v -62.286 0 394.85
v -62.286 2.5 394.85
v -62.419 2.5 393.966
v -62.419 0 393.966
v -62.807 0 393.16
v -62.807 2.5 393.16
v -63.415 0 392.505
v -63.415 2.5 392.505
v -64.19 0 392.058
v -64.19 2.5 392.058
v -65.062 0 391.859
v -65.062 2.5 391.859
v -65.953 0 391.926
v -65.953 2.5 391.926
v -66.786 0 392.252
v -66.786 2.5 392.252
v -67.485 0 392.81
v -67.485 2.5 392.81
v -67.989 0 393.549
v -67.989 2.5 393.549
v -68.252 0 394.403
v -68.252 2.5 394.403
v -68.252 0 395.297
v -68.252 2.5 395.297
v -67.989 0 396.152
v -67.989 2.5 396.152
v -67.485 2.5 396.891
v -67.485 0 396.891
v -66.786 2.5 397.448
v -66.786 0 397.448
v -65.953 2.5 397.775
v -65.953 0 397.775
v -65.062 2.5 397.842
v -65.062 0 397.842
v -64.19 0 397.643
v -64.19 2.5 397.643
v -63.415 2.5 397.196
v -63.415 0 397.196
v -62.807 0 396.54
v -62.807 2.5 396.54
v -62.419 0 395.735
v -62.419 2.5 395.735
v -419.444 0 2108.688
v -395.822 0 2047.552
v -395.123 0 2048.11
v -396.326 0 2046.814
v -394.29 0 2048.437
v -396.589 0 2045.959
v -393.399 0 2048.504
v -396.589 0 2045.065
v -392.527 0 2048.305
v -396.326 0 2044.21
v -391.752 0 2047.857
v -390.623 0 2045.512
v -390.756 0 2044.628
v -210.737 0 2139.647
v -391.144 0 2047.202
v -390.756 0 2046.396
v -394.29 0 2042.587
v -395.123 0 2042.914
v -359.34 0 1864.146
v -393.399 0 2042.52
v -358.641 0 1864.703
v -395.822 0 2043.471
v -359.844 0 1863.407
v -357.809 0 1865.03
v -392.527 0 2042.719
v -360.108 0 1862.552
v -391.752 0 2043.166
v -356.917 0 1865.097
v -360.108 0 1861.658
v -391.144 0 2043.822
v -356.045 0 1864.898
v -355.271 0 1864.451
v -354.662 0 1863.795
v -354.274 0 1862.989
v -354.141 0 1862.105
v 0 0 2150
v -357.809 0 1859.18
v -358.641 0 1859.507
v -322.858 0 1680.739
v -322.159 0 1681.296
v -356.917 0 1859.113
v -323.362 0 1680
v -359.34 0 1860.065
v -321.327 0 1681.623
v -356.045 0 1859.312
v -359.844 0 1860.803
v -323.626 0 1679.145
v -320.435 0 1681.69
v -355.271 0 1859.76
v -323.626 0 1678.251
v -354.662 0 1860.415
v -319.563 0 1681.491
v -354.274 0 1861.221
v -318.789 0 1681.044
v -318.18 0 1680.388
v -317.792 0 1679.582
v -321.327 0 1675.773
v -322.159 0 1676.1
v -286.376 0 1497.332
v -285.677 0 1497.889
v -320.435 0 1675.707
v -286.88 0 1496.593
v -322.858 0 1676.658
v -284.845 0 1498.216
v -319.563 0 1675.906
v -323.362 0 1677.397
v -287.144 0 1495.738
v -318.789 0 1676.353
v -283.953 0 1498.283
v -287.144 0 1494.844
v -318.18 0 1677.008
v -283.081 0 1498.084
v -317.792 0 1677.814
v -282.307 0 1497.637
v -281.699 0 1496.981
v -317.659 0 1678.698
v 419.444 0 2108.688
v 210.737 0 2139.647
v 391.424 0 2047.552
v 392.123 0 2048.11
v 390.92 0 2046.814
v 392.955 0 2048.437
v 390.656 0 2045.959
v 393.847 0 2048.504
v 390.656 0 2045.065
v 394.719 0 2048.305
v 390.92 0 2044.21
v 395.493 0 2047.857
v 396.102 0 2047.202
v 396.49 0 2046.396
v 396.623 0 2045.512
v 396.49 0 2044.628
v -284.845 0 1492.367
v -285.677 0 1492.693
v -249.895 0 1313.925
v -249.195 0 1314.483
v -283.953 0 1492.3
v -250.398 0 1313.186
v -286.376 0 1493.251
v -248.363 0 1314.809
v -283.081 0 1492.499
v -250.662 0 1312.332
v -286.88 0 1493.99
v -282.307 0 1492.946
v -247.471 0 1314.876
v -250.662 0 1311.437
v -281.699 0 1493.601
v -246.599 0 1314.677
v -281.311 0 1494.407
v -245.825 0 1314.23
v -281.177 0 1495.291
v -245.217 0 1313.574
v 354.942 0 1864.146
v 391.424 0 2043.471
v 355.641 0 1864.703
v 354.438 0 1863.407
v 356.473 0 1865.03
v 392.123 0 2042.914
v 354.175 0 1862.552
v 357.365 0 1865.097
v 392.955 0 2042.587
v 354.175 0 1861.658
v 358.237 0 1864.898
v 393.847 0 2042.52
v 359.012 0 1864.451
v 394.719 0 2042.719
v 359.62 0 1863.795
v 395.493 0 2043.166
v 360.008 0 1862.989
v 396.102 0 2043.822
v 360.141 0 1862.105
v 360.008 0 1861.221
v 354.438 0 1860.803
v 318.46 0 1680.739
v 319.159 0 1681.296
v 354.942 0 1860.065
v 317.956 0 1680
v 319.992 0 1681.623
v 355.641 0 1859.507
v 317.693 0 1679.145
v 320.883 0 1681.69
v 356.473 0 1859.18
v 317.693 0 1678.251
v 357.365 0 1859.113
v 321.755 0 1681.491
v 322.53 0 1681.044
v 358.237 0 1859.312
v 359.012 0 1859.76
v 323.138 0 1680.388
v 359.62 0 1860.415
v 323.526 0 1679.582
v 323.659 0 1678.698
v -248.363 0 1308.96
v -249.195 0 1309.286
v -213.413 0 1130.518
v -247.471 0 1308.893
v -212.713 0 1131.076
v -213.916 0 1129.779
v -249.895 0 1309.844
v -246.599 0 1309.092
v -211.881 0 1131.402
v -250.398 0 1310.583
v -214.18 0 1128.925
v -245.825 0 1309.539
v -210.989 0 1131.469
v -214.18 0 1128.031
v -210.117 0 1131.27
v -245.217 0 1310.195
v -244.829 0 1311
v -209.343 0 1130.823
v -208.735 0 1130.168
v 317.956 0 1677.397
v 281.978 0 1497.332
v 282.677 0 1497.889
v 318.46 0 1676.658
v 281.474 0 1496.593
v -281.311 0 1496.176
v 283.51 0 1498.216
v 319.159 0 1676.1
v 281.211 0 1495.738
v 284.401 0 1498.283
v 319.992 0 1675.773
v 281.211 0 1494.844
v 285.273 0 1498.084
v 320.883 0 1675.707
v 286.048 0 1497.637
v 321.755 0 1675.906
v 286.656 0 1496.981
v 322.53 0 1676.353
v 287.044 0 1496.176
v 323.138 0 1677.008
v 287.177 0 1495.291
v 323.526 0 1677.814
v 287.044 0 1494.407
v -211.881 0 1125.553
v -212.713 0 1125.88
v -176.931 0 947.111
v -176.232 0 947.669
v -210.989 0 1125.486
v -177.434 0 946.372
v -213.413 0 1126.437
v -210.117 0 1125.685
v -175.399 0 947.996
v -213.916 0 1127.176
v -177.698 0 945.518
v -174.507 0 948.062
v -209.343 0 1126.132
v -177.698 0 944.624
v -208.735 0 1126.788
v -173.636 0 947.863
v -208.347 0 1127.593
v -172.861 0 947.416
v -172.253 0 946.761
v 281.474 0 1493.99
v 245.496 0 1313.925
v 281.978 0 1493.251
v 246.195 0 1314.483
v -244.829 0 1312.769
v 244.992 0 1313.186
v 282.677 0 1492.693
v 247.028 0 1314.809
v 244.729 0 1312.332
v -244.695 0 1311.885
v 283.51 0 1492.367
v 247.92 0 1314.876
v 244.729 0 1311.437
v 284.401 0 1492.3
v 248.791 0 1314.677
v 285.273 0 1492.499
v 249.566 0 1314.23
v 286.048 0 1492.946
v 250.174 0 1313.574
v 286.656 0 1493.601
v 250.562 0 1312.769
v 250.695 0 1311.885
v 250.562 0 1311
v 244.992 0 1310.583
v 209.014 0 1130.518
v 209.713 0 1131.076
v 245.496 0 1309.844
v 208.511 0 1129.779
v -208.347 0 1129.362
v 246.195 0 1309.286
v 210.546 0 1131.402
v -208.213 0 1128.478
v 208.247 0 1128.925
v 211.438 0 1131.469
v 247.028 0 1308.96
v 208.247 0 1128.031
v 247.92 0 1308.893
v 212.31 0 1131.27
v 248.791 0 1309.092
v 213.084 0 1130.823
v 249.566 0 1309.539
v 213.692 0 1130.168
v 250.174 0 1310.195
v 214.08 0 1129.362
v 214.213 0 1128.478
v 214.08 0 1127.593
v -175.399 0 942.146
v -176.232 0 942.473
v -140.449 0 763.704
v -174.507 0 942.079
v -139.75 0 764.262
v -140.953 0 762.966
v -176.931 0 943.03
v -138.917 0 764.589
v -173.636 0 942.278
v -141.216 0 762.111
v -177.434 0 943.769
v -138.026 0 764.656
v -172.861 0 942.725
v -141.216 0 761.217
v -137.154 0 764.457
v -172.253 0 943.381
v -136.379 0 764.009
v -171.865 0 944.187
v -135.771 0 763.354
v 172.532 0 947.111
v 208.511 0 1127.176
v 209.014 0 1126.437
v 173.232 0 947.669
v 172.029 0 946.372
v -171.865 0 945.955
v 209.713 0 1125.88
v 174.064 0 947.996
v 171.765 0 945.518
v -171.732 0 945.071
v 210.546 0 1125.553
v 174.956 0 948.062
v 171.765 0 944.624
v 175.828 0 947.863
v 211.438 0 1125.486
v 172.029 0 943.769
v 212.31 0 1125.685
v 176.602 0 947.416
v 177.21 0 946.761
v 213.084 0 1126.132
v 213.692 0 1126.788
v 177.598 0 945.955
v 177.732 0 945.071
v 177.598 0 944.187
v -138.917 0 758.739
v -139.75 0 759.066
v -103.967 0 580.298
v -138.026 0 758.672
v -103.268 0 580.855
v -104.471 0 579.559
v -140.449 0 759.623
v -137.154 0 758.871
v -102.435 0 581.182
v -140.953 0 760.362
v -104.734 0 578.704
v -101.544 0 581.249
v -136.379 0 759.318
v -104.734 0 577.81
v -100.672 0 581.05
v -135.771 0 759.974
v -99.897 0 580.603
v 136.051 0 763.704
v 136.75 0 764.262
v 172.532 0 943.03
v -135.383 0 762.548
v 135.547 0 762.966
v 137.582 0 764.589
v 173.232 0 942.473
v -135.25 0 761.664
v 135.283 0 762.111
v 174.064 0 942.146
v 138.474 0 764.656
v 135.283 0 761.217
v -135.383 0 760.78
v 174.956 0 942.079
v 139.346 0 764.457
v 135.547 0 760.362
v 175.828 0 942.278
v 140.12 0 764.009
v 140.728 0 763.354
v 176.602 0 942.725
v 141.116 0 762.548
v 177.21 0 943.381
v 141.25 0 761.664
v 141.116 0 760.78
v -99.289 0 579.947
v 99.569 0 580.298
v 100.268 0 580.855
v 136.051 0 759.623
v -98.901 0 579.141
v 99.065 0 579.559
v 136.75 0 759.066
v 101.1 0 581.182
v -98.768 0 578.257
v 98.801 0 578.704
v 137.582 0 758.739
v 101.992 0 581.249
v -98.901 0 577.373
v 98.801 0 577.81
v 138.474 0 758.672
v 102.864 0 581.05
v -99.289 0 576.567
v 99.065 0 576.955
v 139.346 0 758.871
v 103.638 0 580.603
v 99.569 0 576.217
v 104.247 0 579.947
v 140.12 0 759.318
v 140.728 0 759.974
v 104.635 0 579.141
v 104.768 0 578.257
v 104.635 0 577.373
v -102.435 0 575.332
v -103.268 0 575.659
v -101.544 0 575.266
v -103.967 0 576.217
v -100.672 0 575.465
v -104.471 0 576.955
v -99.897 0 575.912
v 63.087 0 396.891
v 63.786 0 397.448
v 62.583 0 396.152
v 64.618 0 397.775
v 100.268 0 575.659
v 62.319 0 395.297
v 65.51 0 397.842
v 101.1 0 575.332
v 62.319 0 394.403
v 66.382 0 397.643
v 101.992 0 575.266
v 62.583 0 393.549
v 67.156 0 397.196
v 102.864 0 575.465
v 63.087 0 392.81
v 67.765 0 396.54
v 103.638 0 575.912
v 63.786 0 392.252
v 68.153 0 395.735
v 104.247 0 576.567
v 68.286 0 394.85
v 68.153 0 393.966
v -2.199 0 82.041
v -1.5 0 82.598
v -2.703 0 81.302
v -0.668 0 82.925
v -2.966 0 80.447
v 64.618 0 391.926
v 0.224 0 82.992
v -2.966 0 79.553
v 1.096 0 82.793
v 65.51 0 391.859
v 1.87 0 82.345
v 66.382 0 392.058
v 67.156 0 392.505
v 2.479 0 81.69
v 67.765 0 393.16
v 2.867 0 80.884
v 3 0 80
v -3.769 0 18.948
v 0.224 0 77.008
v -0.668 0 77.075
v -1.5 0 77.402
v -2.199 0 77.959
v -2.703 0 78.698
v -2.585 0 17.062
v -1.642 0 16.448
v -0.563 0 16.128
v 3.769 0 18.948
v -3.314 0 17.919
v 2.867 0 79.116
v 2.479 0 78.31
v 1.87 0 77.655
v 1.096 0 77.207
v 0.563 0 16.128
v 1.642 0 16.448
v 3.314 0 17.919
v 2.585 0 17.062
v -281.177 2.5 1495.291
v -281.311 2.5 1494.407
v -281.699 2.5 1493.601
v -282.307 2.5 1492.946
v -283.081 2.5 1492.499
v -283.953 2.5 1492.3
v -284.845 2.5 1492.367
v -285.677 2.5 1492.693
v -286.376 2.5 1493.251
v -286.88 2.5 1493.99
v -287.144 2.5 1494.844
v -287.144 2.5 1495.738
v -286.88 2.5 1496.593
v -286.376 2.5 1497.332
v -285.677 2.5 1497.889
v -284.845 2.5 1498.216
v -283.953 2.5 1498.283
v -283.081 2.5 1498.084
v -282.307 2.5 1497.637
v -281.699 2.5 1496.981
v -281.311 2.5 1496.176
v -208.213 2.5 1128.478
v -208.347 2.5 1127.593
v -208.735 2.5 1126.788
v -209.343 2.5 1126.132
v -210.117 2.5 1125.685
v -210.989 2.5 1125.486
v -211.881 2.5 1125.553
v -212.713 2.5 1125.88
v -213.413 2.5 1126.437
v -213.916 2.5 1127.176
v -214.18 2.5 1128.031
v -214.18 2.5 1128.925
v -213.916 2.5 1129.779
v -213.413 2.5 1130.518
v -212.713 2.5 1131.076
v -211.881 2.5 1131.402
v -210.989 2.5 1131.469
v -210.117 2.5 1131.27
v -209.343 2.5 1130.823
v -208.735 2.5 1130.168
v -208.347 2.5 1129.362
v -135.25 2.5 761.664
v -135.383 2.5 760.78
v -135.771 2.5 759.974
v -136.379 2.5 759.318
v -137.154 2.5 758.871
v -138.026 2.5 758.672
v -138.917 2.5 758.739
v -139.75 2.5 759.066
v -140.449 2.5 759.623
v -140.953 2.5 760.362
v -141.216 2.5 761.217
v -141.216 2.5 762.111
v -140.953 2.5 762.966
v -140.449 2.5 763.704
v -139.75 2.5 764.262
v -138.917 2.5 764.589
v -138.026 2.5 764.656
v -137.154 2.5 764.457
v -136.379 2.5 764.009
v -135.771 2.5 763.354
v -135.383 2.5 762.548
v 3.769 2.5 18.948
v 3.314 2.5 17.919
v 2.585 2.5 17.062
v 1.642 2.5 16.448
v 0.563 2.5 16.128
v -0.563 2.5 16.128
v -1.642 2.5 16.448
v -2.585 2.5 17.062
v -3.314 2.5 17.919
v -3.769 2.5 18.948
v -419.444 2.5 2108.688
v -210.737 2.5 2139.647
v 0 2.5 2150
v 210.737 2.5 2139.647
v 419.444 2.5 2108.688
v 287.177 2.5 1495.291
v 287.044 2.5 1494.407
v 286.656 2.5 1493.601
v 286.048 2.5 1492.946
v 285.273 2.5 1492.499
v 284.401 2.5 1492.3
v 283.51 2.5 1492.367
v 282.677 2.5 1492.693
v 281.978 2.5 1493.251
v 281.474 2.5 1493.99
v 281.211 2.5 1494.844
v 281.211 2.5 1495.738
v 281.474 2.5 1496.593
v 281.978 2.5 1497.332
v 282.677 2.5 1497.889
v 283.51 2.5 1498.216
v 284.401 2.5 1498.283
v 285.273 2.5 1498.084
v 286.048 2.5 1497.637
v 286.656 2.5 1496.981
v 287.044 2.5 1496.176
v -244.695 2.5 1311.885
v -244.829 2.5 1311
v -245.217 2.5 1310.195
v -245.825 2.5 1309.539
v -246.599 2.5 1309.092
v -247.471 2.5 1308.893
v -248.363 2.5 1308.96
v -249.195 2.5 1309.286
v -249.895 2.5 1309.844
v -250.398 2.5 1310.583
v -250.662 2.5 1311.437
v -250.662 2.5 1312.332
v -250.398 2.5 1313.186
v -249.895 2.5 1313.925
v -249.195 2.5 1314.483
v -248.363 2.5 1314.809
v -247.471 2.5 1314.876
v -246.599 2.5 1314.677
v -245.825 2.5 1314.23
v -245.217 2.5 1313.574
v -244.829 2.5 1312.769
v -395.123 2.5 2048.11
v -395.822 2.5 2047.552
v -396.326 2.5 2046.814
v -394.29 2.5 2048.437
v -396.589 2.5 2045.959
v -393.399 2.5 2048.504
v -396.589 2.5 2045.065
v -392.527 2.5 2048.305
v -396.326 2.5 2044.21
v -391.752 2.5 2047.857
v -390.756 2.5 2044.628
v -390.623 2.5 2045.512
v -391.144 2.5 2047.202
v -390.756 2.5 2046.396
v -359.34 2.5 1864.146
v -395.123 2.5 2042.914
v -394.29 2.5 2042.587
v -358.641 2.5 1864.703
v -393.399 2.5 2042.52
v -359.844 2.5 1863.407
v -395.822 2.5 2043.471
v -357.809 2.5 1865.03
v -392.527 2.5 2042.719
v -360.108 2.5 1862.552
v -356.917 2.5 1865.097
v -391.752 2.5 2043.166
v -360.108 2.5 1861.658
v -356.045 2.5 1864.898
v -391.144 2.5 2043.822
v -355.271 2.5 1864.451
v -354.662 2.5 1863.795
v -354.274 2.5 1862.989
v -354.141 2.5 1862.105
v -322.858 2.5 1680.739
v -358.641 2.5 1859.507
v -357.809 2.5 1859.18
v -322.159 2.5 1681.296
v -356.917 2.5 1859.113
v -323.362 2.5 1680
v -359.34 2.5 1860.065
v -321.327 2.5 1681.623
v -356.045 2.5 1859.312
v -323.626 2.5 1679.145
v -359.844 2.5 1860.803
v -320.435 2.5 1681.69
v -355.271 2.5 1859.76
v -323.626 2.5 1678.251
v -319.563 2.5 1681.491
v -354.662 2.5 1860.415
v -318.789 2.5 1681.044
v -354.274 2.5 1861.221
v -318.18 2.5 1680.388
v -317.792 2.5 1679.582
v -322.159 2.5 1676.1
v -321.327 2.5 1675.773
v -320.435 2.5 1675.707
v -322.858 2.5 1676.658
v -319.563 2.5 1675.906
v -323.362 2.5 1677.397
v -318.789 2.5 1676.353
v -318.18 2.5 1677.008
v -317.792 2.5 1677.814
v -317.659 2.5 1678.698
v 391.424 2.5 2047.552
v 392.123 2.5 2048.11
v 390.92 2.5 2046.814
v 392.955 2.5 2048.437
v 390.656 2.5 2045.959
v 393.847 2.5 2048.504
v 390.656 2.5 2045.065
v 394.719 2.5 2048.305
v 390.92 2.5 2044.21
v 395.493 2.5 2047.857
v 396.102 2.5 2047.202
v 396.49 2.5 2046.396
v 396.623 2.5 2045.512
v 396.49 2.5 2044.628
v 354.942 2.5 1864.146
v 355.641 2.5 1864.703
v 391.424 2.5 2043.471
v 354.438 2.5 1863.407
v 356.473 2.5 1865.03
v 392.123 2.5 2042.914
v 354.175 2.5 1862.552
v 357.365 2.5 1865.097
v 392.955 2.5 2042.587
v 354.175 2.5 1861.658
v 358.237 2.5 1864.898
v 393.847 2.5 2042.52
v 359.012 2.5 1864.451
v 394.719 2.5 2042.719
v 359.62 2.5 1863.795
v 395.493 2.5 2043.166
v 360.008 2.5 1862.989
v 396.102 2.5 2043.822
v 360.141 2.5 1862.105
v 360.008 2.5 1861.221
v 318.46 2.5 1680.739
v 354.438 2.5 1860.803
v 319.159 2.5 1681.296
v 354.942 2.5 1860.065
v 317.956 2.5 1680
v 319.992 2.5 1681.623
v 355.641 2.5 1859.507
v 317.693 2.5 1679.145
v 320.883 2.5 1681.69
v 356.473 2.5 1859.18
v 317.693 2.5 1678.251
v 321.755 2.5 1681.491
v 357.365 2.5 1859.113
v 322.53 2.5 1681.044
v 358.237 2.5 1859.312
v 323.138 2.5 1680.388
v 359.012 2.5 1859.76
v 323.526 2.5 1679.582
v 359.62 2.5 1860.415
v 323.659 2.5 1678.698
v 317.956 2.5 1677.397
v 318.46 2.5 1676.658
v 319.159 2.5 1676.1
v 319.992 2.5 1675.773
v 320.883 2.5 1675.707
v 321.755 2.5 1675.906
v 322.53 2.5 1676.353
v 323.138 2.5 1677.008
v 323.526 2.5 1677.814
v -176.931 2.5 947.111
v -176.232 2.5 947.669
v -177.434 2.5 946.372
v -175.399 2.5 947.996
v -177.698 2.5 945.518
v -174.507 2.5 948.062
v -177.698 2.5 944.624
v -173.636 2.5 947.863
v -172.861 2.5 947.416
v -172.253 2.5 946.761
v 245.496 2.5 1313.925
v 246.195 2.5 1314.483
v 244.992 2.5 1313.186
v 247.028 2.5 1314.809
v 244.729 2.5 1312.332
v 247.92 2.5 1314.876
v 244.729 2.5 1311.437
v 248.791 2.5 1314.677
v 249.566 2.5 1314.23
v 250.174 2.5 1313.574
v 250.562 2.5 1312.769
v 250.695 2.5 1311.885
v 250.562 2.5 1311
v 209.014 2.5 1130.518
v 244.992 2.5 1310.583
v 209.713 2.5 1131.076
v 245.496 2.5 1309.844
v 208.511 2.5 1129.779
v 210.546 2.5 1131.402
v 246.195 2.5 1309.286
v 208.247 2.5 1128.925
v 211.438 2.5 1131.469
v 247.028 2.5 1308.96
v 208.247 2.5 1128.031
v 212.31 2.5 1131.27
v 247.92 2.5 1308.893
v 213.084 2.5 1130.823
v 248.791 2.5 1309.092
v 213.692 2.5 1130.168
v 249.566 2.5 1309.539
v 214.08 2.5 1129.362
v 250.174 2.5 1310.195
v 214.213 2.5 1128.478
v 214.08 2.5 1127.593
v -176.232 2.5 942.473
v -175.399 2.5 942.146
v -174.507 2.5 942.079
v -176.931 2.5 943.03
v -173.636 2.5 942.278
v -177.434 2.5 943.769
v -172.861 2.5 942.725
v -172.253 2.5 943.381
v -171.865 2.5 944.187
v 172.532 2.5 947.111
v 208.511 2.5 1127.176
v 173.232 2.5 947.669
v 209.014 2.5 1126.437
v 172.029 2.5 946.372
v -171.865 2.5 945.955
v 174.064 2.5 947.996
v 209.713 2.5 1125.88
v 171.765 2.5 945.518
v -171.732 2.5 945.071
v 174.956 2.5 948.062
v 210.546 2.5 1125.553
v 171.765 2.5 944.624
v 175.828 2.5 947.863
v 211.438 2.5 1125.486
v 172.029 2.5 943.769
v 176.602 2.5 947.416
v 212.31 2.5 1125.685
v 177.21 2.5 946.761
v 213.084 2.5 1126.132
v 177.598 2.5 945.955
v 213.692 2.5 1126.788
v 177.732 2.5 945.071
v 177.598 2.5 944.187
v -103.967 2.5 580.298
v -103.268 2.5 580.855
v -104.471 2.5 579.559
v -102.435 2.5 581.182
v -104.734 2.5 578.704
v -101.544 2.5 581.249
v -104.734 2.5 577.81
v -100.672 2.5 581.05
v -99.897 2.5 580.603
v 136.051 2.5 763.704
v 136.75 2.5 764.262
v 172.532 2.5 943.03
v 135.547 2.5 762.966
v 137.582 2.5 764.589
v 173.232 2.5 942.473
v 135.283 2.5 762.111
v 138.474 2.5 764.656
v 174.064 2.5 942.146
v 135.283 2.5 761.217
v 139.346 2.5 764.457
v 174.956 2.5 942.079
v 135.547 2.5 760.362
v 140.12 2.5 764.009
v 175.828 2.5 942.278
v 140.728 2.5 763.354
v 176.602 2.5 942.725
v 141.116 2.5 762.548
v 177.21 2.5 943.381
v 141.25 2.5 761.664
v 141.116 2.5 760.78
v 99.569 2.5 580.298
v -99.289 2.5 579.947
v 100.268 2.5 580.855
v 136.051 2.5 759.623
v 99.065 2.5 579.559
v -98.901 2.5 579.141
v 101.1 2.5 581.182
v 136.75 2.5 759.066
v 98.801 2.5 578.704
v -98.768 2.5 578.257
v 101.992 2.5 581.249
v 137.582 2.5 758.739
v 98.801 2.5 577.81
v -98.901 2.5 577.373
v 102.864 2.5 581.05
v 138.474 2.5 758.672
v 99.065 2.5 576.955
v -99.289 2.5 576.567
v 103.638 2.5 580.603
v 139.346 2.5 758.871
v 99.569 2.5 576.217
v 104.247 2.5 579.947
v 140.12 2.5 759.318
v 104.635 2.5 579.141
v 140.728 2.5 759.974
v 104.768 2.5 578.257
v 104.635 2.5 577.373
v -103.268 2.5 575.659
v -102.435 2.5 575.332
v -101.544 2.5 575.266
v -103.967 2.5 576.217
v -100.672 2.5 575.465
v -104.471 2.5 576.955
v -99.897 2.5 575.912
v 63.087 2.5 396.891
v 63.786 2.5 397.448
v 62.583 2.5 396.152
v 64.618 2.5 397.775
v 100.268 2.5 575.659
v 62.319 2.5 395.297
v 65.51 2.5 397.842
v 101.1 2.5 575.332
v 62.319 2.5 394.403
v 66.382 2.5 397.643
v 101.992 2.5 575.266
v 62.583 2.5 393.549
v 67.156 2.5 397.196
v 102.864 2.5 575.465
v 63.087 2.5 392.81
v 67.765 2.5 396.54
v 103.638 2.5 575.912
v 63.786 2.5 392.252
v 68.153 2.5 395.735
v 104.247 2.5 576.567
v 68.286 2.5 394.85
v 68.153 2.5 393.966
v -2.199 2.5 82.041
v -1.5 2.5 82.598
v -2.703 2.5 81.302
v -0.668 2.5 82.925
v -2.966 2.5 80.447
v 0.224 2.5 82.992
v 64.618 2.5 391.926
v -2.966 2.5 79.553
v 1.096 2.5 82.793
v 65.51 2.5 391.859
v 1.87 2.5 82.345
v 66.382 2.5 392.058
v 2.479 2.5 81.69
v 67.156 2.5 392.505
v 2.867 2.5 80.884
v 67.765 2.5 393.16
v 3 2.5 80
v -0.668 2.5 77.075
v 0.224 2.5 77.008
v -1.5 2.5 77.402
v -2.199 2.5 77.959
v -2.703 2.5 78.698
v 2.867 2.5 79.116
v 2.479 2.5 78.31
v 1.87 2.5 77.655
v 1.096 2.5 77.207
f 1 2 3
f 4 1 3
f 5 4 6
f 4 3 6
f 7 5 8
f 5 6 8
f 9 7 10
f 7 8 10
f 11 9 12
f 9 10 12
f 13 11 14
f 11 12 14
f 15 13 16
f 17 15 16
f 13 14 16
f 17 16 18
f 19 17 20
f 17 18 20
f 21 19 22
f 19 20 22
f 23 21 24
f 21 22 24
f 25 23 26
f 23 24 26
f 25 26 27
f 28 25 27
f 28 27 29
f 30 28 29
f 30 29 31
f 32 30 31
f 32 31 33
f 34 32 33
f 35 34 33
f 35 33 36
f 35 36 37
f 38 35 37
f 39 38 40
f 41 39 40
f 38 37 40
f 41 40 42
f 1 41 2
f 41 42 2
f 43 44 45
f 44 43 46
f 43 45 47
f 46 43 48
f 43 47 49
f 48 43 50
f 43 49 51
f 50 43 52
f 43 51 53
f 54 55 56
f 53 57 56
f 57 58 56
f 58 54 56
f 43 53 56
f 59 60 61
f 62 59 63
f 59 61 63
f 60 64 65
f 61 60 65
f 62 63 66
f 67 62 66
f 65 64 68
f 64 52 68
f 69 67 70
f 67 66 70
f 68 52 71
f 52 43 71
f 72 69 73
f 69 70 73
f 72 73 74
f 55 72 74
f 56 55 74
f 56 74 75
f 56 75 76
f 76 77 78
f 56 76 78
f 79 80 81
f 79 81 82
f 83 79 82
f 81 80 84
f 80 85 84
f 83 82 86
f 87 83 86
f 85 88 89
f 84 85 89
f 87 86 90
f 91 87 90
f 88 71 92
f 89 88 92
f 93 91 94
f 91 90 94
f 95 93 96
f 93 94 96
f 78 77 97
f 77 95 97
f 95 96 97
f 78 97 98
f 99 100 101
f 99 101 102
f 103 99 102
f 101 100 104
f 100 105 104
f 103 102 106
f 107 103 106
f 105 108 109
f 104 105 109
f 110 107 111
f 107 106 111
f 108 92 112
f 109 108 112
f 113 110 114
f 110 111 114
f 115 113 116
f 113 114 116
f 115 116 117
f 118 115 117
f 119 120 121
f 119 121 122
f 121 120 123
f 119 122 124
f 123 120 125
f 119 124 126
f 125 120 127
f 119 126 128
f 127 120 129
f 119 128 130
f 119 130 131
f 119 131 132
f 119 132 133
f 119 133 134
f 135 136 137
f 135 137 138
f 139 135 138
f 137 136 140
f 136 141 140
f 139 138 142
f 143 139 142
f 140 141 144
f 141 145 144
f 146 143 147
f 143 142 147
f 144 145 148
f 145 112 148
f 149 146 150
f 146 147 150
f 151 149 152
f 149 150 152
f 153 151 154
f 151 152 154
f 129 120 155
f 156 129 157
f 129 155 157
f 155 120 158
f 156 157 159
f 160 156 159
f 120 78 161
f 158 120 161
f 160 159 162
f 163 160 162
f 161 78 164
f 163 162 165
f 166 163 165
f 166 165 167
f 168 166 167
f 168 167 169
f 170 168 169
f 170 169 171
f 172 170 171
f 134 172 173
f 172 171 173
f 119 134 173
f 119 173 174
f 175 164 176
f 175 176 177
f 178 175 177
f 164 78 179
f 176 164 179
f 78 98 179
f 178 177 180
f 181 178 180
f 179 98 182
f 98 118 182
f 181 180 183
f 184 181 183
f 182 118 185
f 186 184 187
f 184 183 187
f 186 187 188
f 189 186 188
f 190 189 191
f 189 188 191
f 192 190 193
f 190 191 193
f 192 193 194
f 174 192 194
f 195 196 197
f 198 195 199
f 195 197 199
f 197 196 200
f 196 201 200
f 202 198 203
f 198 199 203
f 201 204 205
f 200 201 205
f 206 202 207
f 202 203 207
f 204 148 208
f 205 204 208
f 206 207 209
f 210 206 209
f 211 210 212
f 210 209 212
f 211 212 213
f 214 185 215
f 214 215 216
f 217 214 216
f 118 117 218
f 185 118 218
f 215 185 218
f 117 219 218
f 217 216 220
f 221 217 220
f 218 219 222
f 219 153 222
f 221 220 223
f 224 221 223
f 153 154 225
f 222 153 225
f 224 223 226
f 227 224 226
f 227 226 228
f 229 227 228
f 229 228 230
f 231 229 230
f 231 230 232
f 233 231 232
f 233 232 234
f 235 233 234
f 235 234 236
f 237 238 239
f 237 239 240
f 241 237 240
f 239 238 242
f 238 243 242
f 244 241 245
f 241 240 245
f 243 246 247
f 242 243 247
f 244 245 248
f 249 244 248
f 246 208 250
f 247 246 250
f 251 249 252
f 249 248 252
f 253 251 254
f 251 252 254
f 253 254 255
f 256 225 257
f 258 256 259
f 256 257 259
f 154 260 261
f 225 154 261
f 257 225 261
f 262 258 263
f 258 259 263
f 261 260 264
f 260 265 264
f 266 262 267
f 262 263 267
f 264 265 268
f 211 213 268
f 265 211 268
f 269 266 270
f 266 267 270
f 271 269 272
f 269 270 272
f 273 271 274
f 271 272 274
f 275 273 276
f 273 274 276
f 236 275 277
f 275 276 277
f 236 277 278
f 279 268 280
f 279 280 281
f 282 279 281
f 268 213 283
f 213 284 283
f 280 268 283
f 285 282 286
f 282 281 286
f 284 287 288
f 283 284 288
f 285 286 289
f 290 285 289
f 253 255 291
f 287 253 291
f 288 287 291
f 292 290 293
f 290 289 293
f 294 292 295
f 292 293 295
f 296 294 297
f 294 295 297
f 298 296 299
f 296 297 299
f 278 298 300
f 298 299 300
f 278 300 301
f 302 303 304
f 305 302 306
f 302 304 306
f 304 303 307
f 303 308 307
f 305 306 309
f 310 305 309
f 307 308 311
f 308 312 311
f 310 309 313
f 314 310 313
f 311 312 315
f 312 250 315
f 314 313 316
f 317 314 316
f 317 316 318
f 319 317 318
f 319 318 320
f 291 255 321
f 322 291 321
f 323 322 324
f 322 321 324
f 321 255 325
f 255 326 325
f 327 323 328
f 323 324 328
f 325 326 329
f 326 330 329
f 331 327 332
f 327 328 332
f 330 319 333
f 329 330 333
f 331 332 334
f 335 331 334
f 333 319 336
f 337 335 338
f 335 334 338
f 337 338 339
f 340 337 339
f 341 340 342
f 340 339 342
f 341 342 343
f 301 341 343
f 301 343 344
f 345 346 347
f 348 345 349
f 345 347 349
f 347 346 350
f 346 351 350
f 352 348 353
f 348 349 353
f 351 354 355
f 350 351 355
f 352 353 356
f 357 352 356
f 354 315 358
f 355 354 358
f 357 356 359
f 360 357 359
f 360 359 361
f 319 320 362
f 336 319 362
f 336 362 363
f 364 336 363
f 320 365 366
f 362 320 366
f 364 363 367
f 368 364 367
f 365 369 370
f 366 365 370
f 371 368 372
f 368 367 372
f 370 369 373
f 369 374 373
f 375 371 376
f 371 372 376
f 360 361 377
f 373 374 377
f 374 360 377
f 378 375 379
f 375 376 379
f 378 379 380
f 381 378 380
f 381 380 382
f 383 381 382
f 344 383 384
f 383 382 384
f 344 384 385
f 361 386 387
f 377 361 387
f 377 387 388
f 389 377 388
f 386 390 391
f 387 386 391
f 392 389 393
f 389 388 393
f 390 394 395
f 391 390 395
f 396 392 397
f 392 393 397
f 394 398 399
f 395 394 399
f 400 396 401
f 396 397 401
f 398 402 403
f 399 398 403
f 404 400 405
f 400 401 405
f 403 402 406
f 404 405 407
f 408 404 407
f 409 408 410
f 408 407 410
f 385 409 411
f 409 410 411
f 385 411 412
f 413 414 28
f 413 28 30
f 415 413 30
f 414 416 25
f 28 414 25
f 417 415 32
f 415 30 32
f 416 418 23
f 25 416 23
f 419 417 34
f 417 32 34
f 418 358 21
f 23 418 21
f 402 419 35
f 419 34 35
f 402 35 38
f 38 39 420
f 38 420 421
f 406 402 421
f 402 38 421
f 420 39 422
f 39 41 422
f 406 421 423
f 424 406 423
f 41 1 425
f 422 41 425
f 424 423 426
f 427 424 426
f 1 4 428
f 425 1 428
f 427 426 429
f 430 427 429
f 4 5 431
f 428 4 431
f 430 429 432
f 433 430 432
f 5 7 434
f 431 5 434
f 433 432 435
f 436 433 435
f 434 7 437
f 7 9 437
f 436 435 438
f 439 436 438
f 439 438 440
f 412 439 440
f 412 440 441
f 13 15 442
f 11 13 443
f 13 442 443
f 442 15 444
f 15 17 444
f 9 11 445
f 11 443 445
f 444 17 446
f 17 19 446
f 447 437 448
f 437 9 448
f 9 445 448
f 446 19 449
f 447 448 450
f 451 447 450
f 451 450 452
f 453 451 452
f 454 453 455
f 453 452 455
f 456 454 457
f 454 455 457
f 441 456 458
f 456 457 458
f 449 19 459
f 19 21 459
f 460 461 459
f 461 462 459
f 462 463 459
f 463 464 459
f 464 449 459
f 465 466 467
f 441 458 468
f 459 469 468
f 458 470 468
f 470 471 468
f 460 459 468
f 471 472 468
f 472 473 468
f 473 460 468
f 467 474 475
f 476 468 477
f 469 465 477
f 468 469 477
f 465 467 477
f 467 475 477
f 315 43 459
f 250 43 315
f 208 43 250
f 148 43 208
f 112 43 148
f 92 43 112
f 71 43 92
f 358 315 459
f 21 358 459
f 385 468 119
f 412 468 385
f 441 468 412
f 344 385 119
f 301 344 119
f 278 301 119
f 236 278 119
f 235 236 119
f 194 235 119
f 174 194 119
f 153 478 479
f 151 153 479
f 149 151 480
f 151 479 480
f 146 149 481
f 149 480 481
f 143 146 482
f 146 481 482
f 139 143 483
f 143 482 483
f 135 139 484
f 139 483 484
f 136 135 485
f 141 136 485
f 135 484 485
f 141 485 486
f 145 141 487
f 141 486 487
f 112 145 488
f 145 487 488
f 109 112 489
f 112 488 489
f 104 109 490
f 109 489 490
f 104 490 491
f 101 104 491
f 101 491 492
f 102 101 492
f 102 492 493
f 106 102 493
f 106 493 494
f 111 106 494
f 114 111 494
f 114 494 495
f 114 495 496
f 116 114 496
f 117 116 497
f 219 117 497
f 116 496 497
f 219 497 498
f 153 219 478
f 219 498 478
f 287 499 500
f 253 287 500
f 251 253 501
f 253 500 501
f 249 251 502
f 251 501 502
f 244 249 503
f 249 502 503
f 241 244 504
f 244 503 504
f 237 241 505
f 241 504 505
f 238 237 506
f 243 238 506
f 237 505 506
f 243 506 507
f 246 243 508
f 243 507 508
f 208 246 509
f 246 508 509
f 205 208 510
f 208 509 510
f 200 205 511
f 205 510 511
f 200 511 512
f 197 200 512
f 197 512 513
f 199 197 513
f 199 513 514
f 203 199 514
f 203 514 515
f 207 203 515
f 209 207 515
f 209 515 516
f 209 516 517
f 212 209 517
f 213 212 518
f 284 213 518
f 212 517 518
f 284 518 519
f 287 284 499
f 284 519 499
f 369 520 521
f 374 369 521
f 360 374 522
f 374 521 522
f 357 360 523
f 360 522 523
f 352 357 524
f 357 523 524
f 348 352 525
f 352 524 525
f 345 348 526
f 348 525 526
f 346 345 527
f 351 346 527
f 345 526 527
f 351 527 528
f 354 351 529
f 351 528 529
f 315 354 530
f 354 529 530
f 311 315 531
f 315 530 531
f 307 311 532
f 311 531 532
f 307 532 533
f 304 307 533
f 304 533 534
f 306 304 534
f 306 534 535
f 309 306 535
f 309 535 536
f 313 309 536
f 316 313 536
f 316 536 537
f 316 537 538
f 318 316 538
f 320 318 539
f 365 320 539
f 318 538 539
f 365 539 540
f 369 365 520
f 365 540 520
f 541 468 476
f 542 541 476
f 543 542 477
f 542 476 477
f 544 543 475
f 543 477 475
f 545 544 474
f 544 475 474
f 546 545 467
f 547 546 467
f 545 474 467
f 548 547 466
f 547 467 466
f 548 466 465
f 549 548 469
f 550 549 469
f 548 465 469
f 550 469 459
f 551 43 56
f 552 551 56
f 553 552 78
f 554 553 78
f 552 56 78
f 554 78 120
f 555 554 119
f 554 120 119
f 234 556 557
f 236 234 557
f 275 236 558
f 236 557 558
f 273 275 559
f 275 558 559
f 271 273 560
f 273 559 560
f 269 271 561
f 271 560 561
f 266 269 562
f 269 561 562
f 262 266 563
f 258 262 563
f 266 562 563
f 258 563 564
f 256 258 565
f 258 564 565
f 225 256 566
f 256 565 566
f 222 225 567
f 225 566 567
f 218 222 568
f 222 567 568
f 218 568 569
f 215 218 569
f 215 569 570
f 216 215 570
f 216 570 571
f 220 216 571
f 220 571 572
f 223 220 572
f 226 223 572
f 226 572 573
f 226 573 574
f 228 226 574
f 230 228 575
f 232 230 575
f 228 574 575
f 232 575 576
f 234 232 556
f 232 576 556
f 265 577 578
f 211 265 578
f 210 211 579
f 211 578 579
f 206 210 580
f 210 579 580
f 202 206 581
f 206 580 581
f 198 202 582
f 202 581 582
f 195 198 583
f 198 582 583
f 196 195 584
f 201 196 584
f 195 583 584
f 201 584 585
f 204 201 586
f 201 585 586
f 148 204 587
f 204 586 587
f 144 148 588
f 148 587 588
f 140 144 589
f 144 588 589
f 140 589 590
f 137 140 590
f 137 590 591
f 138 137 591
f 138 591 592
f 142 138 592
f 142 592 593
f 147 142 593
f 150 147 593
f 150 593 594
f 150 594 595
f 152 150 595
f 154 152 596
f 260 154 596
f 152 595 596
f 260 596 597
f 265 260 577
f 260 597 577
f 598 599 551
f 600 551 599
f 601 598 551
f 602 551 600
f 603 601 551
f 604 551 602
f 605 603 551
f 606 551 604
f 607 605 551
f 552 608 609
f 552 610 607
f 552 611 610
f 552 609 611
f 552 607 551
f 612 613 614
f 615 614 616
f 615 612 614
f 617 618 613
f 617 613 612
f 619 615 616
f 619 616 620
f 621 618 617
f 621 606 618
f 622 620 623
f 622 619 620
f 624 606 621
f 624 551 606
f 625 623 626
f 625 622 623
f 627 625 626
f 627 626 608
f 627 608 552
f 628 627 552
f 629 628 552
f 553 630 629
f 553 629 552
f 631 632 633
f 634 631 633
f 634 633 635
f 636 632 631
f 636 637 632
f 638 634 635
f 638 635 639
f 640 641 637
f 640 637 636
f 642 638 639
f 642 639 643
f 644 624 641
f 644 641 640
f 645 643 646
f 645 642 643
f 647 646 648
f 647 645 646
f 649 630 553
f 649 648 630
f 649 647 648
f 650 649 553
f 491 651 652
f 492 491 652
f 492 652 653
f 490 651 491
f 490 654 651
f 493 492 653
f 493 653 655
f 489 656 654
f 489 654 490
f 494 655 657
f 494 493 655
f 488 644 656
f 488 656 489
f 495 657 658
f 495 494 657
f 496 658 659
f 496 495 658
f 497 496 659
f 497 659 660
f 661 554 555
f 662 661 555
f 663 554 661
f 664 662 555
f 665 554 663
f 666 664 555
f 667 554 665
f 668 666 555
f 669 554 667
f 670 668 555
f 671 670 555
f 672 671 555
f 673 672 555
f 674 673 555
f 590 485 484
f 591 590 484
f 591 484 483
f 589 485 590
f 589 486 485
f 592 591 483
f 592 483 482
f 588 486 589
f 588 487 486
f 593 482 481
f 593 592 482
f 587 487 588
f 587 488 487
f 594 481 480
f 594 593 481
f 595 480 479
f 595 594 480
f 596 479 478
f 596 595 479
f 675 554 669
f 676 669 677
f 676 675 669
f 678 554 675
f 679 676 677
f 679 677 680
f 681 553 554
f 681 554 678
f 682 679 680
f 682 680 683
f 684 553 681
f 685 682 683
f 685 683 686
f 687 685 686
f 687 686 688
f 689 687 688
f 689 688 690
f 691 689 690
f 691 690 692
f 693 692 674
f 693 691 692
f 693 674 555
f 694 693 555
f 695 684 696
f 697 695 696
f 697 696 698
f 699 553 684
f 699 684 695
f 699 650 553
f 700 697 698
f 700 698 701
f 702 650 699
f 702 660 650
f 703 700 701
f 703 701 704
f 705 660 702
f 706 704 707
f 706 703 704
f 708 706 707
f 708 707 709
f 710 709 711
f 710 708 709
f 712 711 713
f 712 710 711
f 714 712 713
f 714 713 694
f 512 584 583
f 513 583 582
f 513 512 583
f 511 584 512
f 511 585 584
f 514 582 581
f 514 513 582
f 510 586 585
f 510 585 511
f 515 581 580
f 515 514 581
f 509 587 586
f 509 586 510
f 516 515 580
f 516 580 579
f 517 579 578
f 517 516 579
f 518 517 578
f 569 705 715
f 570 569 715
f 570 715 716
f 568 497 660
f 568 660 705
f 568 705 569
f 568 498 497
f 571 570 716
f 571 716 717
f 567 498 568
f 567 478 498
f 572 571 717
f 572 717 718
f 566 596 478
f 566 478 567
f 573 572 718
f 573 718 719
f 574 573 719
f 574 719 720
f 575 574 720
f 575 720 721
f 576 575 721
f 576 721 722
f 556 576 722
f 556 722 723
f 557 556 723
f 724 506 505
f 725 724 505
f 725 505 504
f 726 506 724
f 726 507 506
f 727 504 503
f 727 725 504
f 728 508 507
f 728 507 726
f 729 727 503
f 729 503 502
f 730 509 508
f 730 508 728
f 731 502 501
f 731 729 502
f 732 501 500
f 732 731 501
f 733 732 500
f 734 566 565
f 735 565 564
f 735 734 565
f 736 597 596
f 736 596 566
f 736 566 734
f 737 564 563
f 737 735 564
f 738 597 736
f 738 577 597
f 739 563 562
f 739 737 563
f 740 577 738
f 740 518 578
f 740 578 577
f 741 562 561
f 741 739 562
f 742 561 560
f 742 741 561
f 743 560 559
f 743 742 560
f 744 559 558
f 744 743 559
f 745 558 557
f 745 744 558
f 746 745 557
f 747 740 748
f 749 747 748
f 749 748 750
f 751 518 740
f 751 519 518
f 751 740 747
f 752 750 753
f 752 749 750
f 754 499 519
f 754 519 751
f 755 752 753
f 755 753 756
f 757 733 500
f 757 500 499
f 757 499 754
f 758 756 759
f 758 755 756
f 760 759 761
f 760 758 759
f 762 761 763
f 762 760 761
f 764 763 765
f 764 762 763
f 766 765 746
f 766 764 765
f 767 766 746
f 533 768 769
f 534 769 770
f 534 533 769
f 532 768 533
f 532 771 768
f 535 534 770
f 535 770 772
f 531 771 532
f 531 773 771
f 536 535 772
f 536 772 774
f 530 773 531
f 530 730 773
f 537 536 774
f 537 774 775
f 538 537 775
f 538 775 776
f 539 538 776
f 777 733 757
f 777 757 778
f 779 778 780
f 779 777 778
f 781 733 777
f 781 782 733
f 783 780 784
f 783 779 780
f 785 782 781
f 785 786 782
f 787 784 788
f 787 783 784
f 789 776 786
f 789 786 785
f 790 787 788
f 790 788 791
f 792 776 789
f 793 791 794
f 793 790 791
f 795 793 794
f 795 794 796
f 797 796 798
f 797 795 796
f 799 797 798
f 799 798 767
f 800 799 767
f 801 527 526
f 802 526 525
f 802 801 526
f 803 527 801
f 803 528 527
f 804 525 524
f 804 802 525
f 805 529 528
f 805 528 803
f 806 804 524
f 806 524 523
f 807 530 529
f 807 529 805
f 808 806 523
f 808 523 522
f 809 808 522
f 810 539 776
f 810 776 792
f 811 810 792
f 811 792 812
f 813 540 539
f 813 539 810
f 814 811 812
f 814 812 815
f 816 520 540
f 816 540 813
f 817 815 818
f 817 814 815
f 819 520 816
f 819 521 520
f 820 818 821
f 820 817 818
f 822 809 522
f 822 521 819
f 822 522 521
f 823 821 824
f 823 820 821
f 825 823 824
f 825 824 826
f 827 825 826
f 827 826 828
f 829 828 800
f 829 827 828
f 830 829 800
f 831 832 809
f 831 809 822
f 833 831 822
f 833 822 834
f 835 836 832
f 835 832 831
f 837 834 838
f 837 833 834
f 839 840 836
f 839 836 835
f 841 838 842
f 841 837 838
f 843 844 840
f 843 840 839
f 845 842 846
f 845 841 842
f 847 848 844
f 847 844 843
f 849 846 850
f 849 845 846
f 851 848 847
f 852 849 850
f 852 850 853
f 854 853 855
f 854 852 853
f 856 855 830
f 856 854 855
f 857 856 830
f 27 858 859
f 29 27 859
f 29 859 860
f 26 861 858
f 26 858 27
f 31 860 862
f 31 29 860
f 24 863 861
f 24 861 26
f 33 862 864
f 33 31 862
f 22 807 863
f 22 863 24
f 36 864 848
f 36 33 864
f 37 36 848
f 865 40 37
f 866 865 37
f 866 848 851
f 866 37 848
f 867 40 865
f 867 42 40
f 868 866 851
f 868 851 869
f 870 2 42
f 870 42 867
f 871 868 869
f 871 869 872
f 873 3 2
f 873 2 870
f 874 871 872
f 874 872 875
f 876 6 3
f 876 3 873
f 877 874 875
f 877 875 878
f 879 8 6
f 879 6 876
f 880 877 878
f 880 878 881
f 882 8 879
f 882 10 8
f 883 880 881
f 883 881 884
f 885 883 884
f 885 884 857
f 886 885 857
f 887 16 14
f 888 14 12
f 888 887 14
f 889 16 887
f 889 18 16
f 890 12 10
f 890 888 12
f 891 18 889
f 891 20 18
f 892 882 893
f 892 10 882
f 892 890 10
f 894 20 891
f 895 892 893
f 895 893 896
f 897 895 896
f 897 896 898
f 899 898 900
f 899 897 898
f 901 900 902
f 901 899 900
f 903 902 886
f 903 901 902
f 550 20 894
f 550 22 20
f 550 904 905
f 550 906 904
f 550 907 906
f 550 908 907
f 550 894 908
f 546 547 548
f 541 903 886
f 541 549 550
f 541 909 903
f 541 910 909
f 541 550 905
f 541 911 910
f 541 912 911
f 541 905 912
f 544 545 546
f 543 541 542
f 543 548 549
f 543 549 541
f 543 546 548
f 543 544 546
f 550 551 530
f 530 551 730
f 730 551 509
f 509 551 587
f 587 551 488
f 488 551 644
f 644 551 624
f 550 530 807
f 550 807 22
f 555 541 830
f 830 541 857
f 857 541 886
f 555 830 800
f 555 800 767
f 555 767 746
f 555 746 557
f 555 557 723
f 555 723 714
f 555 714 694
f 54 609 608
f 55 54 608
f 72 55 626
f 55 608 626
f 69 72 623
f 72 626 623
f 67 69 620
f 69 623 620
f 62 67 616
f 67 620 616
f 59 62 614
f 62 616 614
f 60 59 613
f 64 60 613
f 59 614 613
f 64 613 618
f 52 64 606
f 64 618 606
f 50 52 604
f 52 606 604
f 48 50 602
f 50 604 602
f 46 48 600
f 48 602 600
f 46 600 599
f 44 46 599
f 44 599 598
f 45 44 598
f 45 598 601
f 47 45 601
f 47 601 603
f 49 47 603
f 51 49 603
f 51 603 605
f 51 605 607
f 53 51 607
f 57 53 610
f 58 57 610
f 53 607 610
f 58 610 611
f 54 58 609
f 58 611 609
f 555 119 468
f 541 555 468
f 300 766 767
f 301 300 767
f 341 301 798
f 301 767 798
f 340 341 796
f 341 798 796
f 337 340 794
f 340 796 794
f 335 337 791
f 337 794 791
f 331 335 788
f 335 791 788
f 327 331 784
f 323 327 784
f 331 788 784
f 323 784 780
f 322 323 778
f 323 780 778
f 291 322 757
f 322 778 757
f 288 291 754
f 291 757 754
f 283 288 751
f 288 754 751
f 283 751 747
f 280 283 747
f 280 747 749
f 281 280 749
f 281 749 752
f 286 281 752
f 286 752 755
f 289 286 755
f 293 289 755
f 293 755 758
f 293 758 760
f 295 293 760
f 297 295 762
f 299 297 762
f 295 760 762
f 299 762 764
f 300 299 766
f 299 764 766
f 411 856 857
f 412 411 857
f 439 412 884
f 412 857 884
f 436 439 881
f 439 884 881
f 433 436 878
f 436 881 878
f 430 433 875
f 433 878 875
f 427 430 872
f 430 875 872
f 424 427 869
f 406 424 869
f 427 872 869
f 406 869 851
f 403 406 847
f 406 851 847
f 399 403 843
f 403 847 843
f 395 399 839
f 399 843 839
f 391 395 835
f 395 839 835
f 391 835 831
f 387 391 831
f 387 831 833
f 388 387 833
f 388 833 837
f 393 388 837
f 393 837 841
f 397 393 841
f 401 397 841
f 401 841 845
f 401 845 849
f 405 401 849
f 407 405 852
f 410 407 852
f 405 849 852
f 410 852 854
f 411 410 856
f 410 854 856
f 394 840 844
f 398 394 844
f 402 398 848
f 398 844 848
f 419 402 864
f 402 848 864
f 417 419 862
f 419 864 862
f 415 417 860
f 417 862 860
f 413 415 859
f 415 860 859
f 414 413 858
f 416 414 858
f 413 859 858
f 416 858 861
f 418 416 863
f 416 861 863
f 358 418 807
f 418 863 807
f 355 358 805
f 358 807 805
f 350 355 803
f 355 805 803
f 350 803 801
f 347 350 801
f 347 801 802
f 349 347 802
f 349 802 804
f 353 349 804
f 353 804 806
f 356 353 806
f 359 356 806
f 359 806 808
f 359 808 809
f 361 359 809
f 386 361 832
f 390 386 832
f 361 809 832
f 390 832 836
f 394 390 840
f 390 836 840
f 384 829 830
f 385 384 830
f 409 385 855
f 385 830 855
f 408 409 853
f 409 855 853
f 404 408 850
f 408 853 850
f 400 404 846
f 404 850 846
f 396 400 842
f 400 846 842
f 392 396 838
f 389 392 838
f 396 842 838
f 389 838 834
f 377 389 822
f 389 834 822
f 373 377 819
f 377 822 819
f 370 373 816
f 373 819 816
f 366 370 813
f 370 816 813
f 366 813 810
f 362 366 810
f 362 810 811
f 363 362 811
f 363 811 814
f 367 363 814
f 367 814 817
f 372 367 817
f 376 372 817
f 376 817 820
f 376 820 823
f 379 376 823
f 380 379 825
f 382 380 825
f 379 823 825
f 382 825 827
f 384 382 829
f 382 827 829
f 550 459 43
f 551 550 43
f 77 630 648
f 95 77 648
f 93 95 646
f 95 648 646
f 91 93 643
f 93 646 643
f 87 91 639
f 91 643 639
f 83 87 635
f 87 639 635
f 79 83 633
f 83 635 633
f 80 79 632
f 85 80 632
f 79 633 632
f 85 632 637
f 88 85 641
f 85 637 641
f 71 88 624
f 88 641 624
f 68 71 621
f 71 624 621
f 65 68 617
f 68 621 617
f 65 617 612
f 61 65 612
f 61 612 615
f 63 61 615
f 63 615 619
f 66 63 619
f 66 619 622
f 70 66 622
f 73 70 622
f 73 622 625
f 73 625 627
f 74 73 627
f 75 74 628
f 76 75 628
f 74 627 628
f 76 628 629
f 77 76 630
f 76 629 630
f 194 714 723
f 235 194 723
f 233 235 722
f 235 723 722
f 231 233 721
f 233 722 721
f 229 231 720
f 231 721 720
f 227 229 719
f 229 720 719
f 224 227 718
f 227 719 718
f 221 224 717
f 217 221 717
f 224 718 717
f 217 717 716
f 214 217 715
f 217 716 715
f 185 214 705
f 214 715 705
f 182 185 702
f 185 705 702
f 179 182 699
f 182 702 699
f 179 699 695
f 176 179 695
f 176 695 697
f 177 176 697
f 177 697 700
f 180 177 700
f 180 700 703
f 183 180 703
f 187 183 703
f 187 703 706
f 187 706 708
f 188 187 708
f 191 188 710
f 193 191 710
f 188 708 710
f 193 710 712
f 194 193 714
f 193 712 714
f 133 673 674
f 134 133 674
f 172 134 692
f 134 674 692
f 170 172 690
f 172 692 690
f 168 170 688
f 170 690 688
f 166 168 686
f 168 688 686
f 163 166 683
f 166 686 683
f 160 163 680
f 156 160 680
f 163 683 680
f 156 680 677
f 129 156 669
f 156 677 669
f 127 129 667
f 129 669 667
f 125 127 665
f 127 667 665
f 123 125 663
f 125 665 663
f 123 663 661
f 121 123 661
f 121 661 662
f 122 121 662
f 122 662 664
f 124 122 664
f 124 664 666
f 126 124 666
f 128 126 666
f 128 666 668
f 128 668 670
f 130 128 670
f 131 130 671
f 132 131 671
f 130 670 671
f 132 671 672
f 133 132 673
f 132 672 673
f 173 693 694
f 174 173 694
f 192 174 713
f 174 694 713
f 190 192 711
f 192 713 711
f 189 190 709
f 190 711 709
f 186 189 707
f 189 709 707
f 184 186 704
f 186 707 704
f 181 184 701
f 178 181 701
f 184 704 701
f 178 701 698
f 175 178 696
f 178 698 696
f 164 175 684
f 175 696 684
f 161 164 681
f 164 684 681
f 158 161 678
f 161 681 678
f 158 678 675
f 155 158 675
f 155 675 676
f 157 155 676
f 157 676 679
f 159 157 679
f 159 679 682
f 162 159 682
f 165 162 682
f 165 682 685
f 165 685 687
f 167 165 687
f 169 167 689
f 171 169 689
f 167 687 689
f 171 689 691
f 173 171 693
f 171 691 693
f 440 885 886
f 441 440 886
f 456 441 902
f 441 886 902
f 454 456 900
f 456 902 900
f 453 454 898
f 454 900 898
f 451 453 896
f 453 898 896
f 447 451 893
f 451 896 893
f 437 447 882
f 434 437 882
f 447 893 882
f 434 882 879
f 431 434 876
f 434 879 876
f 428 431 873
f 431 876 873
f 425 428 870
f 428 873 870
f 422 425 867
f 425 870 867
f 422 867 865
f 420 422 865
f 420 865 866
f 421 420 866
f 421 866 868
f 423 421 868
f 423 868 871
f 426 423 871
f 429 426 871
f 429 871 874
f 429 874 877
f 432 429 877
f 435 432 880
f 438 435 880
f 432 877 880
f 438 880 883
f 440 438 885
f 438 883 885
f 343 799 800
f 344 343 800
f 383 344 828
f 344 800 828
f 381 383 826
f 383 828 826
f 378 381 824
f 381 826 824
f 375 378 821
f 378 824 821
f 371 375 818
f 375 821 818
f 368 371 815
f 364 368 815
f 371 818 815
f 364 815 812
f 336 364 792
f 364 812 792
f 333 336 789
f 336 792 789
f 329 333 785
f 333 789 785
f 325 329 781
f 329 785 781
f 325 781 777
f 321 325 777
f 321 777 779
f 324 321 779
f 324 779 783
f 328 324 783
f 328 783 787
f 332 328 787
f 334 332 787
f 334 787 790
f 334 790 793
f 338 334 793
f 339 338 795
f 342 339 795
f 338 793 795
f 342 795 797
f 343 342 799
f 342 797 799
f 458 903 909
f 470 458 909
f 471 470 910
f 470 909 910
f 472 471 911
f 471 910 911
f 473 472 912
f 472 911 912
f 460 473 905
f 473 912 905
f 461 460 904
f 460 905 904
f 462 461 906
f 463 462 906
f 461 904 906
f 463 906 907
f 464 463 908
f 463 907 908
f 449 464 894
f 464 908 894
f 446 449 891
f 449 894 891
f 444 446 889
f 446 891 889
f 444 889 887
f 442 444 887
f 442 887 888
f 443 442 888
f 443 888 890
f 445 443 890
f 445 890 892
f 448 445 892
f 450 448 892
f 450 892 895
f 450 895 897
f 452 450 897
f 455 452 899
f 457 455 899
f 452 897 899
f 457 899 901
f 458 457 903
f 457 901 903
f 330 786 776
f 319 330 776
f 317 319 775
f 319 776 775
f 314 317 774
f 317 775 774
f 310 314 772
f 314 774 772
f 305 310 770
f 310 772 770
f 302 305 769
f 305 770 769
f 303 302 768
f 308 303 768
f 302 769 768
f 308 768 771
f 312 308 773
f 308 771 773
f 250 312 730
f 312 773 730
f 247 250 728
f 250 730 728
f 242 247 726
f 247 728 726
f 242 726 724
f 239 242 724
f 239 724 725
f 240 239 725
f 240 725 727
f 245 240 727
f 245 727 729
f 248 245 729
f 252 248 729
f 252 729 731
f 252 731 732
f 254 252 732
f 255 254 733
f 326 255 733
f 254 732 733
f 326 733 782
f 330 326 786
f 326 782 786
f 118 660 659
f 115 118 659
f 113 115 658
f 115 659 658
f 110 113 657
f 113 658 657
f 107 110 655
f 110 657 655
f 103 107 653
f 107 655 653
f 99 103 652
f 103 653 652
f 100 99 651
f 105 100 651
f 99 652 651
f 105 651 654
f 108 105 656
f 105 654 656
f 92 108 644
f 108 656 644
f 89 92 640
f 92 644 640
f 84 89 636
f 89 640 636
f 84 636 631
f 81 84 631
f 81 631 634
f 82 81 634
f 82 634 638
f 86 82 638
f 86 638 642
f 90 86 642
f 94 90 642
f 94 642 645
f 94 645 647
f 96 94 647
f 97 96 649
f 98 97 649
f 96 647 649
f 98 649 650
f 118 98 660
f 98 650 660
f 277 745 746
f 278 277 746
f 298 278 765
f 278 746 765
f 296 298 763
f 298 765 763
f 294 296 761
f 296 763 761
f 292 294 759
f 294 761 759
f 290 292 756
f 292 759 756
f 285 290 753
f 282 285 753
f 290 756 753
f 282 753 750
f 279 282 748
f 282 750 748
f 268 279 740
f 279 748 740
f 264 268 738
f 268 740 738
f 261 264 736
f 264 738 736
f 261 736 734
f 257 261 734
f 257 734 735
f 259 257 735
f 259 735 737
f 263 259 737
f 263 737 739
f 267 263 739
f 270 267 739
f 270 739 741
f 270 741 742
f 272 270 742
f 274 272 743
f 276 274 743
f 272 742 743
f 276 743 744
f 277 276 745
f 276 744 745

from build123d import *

# Parameters (mm, degrees)
BOSS_EXTRUDE1_DEPTH = 2.5
SKETCH2_R           = 3
CUT_EXTRUDE1_DEPTH  = 2.5


with BuildPart() as part:
    # Sketch1 → Boss-Extrude1 (new body)
    with BuildSketch(Plane(origin=(0, 0, 0), x_dir=(1, 0, 0), z_dir=(0, 1, 0))):
        with BuildLine():
            Line((-3.769046254, -18.94827508), (-419.444192335, -2108.688352867))
            ThreePointArc((-419.444192335, -2108.688352867), (0, -2150), (419.444192335, -2108.688352867))
            Line((419.444192335, -2108.688352867), (3.769046254, -18.94827508))
            ThreePointArc((3.769046254, -18.94827508), (0, -16.086966015), (-3.769046254, -18.94827508))
        make_face()
    extrude(amount=BOSS_EXTRUDE1_DEPTH)

    # Sketch2 → Cut-Extrude1 (cut)
    with BuildSketch(Plane(origin=(0, 2.5, 0), x_dir=(1, 0, 0), z_dir=(0, 1, 0))):
        with Locations((-393.622932114, -2045.511913266)):
            Circle(SKETCH2_R)
        with Locations((-357.141041897, -1862.105065831)):
            Circle(SKETCH2_R)
        with Locations((-320.65915168, -1678.698218395)):
            Circle(SKETCH2_R)
        with Locations((-284.177261463, -1495.29137096)):
            Circle(SKETCH2_R)
        with Locations((-247.695371246, -1311.884523525)):
            Circle(SKETCH2_R)
        with Locations((-211.213481029, -1128.477676089)):
            Circle(SKETCH2_R)
        with Locations((-174.731590812, -945.070828654)):
            Circle(SKETCH2_R)
        with Locations((-138.249700595, -761.663981218)):
            Circle(SKETCH2_R)
        with Locations((-101.767810378, -578.257133783)):
            Circle(SKETCH2_R)
        with Locations((-65.285920161, -394.850286348)):
            Circle(SKETCH2_R)
        with Locations((65.285920161, -394.850286348)):
            Circle(SKETCH2_R)
        with Locations((101.767810378, -578.257133783)):
            Circle(SKETCH2_R)
        with Locations((138.249700595, -761.663981218)):
            Circle(SKETCH2_R)
        with Locations((174.731590812, -945.070828654)):
            Circle(SKETCH2_R)
        with Locations((211.213481029, -1128.477676089)):
            Circle(SKETCH2_R)
        with Locations((247.695371246, -1311.884523525)):
            Circle(SKETCH2_R)
        with Locations((284.177261463, -1495.29137096)):
            Circle(SKETCH2_R)
        with Locations((320.65915168, -1678.698218395)):
            Circle(SKETCH2_R)
        with Locations((357.141041897, -1862.105065831)):
            Circle(SKETCH2_R)
        with Locations((393.622932114, -2045.511913266)):
            Circle(SKETCH2_R)
        with Locations((0, -80)):
            Circle(SKETCH2_R)
    extrude(amount=-CUT_EXTRUDE1_DEPTH, mode=Mode.SUBTRACT)


solid = part.part
